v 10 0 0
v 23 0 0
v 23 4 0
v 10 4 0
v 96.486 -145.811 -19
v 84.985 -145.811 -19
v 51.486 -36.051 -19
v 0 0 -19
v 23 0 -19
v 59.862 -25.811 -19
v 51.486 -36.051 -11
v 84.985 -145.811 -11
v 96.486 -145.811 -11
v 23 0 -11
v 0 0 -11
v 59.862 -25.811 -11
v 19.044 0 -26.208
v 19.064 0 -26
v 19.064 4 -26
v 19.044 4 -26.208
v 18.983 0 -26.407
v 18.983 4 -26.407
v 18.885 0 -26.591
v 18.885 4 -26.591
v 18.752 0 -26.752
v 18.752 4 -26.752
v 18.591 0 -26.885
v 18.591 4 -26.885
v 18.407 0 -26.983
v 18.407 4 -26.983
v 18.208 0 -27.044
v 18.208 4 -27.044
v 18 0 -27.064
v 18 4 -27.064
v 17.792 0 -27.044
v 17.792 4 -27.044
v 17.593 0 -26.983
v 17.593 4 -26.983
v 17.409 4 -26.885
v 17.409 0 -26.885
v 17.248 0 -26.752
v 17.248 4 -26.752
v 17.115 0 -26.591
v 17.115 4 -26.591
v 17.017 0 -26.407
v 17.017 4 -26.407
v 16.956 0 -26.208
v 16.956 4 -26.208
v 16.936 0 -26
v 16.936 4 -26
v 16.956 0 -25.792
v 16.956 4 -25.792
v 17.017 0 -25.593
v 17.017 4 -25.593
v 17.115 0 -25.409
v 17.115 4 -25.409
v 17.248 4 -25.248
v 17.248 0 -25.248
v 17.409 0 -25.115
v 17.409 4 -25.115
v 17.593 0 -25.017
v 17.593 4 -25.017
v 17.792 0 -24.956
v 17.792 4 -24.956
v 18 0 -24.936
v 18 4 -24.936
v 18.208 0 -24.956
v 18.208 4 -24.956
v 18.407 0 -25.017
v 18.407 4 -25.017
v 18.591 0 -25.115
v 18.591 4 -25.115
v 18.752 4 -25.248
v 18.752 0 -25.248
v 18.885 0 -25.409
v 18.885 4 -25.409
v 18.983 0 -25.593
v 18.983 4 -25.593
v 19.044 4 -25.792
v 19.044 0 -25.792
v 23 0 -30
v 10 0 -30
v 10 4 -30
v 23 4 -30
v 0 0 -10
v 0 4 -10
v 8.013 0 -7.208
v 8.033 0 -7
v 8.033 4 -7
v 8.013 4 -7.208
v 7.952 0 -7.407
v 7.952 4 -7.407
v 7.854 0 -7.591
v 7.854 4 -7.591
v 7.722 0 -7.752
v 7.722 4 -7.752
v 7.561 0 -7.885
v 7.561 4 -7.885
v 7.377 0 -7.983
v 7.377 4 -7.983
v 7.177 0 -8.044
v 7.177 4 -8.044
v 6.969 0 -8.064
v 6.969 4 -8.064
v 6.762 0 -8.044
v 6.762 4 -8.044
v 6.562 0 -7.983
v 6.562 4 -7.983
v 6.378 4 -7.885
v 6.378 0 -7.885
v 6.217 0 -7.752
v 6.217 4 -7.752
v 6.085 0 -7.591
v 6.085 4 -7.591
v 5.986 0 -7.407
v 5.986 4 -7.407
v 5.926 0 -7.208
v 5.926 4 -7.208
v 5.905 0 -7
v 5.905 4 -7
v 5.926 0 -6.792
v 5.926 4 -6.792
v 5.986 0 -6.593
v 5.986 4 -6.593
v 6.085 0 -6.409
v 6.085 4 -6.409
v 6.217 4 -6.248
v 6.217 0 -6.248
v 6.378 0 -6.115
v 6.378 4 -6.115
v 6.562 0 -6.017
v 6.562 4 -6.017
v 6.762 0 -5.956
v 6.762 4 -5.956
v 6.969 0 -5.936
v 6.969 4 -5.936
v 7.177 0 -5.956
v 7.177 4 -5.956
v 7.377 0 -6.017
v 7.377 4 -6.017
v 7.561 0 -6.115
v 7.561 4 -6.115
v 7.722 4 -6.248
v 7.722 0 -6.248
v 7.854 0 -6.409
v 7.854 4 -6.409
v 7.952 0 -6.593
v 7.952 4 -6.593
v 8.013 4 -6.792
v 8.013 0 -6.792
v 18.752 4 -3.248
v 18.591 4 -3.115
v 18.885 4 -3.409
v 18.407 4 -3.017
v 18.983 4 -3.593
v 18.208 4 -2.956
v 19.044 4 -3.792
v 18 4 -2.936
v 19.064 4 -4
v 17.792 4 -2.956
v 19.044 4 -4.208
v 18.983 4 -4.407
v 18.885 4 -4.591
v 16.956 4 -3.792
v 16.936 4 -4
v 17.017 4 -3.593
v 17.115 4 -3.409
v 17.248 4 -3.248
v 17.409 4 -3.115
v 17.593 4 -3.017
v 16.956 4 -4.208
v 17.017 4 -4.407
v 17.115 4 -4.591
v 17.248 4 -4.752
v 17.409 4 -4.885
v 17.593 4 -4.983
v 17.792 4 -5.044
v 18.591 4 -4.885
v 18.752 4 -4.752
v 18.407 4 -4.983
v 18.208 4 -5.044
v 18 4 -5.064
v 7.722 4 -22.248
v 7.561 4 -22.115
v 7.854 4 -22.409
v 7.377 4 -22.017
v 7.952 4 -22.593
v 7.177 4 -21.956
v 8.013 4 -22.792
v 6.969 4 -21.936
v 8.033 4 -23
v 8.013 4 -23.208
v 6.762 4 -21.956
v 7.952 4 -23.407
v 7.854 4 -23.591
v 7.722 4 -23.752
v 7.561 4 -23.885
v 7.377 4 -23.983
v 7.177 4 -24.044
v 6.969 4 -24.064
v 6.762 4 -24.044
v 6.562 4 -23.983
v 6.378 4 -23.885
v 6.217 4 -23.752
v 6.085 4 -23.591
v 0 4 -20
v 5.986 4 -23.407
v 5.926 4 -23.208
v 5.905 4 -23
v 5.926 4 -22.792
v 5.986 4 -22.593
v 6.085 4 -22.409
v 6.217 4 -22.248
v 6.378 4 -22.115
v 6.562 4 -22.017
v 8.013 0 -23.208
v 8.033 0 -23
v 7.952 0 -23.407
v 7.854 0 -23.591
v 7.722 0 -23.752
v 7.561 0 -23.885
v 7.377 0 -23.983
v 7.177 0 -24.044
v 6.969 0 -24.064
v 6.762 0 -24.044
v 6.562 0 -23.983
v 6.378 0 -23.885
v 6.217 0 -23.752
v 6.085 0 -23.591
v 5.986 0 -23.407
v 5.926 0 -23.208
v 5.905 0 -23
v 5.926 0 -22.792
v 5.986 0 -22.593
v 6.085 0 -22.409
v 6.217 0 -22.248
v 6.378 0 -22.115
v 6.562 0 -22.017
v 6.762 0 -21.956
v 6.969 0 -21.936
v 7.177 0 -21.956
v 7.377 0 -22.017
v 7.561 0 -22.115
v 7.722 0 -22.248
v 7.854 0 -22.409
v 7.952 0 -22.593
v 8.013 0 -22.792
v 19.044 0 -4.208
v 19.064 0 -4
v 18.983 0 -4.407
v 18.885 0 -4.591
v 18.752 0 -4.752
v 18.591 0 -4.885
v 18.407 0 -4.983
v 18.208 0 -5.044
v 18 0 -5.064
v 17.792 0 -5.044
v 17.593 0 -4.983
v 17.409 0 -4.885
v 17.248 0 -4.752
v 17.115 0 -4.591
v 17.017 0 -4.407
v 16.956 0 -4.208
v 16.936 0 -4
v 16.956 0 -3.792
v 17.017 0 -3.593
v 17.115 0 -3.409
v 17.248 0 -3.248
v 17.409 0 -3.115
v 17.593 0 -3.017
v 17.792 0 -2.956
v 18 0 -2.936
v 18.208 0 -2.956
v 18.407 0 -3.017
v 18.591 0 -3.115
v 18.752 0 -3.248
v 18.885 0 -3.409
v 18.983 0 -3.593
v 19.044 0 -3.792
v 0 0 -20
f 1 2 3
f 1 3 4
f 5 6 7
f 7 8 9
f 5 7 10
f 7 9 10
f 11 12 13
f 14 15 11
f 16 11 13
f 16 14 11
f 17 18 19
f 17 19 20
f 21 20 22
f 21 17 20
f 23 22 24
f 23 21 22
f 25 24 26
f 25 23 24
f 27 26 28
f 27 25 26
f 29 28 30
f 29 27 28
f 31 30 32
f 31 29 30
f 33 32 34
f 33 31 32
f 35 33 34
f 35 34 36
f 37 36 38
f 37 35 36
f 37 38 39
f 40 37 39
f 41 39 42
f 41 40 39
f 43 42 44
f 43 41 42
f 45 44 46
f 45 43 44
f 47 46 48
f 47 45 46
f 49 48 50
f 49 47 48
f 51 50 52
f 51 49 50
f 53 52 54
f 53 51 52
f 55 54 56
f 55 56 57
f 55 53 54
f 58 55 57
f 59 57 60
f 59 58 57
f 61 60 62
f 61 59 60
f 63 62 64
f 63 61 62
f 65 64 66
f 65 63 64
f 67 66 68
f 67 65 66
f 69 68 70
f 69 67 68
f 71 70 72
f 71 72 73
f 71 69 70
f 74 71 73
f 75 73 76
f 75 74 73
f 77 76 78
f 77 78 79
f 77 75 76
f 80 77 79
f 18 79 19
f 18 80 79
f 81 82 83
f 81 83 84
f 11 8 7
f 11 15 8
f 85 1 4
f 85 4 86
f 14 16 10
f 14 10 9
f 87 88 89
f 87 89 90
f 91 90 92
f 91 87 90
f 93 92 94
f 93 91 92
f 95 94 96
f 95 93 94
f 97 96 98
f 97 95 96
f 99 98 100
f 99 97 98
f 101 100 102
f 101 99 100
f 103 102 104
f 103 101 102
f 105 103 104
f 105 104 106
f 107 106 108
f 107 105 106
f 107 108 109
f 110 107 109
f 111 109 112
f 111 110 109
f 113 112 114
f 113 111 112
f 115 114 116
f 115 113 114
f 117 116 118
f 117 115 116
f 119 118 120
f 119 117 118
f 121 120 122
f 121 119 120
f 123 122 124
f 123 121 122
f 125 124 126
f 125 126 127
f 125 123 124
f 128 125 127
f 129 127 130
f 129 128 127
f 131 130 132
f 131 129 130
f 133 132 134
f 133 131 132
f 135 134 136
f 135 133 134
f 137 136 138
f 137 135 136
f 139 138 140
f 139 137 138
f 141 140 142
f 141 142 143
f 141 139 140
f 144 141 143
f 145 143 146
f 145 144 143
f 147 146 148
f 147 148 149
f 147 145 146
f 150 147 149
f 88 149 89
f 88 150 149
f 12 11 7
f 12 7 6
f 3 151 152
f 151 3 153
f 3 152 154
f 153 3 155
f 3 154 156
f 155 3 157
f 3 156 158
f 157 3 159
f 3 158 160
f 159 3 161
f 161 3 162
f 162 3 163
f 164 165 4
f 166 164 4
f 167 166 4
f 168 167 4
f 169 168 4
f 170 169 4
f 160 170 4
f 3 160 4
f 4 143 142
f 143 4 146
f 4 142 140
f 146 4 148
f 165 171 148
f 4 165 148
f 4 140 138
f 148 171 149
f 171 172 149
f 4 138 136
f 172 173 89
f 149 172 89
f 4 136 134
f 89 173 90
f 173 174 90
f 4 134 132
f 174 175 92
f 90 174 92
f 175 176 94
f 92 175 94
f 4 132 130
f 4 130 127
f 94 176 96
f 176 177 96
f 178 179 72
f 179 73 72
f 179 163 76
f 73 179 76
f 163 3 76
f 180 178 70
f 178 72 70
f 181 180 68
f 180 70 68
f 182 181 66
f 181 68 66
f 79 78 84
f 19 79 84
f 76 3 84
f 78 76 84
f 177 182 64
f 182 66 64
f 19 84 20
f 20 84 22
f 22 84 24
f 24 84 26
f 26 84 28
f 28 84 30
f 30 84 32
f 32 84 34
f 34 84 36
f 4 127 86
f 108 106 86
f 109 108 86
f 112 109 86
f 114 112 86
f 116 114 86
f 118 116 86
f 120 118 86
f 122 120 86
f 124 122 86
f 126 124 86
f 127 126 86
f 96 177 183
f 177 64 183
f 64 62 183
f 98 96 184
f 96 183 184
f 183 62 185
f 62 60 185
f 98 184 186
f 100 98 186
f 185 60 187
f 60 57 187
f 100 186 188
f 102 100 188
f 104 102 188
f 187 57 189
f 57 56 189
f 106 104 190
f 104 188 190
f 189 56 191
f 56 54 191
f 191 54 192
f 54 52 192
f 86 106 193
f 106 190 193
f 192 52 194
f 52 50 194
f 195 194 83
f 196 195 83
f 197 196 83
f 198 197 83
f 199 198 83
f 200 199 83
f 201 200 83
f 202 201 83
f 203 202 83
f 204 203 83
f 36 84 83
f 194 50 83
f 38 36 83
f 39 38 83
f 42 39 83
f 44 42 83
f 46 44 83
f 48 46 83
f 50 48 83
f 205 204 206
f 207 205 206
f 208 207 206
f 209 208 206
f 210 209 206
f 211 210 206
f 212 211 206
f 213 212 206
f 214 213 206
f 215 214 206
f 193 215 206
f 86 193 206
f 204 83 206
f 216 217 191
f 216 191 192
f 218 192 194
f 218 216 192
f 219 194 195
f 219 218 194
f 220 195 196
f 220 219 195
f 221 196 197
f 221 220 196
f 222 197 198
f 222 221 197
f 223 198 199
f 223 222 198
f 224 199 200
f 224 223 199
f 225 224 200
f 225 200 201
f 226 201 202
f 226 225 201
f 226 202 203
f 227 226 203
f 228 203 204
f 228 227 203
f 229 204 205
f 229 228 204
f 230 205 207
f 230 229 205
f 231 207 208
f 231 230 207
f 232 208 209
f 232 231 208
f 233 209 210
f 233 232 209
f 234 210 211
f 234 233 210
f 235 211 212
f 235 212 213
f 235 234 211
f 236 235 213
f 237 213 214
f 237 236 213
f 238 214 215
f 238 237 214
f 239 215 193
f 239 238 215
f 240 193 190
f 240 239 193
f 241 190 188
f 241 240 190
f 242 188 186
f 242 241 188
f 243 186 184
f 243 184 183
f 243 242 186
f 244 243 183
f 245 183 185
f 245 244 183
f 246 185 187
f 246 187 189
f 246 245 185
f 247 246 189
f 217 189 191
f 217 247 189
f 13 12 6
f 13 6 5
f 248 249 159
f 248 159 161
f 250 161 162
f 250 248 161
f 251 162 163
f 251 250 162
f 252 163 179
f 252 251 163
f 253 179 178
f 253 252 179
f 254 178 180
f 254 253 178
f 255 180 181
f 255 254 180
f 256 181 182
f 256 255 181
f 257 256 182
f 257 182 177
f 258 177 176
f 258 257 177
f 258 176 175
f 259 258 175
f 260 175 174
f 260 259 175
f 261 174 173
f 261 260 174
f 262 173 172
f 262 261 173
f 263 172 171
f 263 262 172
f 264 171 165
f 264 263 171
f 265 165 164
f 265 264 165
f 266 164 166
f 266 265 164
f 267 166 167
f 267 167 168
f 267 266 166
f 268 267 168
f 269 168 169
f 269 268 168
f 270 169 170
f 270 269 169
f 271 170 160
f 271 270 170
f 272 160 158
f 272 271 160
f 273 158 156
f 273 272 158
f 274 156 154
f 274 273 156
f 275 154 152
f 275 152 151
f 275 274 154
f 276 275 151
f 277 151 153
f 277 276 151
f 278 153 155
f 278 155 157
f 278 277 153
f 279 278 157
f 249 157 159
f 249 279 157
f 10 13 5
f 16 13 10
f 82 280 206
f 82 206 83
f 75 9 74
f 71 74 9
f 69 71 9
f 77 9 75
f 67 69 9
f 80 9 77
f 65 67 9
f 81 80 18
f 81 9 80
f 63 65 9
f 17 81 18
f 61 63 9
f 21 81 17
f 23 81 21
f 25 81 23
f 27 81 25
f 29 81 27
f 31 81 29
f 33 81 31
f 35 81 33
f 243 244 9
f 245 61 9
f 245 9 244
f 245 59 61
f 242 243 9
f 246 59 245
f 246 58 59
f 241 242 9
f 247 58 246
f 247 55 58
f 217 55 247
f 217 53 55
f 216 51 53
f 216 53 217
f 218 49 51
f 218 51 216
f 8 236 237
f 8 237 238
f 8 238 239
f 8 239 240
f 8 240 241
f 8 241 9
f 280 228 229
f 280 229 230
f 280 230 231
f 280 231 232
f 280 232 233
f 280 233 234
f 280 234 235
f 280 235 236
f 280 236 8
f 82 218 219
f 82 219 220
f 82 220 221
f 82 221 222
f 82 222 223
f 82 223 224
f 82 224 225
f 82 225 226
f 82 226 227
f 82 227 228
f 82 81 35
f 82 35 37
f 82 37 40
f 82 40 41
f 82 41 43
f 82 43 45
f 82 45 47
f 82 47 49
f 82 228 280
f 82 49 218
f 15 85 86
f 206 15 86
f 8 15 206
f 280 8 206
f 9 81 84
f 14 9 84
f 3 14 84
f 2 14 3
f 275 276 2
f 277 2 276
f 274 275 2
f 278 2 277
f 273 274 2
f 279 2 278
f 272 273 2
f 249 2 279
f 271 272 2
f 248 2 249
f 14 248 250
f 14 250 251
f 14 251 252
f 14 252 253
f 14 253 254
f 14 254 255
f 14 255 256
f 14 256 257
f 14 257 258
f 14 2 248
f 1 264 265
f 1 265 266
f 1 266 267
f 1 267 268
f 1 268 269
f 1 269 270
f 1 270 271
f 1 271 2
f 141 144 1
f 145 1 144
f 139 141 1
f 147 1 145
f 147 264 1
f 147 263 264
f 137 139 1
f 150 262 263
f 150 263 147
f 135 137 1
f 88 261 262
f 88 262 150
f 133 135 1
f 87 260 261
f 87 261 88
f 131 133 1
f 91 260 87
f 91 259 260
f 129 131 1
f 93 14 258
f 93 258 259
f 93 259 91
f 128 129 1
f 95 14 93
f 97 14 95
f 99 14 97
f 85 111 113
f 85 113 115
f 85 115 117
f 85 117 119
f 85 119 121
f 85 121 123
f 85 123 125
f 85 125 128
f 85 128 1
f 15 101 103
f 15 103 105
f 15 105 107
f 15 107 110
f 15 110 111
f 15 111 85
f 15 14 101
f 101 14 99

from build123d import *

# Parameters (mm, degrees)
SKETCH1_R                = 1.063985932
BOSS_EXTRUDE1_DEPTH      = 4
BOSS_EXTRUDE2_DEPTH      = 4
BOSS_EXTRUDE2_DEPTH_BACK = 4


with BuildPart() as part:
    # Sketch1 → Boss-Extrude1 (new body)
    with BuildSketch(Plane(origin=(0, 0, 0), x_dir=(1, 0, 0), z_dir=(0, 1, 0))):
        Polygon((0, 20), (10, 30), (23, 30), (23, 0), (10, 0), (0, 10), align=None)
        with Locations((6.969459898, 7)):
            Circle(SKETCH1_R, mode=Mode.SUBTRACT)
        with Locations((18, 4)):
            Circle(SKETCH1_R, mode=Mode.SUBTRACT)
        with Locations((18, 26)):
            Circle(SKETCH1_R, mode=Mode.SUBTRACT)
        with Locations((6.969459898, 23)):
            Circle(SKETCH1_R, mode=Mode.SUBTRACT)
    extrude(amount=BOSS_EXTRUDE1_DEPTH)

    # Sketch2 → Boss-Extrude2 (add, two sides)
    with BuildSketch(Plane.XY.offset(-15)) as boss_extrude2_sk:
        Polygon((0, 0), (51.486245577, -36.051057267), (84.98533082, -145.810939636), (96.486245577, -145.810939636), (59.861841993, -25.810939636), (23, 0), align=None)
    extrude(amount=BOSS_EXTRUDE2_DEPTH)
    extrude(boss_extrude2_sk.sketch, amount=-BOSS_EXTRUDE2_DEPTH_BACK)


solid = part.part
